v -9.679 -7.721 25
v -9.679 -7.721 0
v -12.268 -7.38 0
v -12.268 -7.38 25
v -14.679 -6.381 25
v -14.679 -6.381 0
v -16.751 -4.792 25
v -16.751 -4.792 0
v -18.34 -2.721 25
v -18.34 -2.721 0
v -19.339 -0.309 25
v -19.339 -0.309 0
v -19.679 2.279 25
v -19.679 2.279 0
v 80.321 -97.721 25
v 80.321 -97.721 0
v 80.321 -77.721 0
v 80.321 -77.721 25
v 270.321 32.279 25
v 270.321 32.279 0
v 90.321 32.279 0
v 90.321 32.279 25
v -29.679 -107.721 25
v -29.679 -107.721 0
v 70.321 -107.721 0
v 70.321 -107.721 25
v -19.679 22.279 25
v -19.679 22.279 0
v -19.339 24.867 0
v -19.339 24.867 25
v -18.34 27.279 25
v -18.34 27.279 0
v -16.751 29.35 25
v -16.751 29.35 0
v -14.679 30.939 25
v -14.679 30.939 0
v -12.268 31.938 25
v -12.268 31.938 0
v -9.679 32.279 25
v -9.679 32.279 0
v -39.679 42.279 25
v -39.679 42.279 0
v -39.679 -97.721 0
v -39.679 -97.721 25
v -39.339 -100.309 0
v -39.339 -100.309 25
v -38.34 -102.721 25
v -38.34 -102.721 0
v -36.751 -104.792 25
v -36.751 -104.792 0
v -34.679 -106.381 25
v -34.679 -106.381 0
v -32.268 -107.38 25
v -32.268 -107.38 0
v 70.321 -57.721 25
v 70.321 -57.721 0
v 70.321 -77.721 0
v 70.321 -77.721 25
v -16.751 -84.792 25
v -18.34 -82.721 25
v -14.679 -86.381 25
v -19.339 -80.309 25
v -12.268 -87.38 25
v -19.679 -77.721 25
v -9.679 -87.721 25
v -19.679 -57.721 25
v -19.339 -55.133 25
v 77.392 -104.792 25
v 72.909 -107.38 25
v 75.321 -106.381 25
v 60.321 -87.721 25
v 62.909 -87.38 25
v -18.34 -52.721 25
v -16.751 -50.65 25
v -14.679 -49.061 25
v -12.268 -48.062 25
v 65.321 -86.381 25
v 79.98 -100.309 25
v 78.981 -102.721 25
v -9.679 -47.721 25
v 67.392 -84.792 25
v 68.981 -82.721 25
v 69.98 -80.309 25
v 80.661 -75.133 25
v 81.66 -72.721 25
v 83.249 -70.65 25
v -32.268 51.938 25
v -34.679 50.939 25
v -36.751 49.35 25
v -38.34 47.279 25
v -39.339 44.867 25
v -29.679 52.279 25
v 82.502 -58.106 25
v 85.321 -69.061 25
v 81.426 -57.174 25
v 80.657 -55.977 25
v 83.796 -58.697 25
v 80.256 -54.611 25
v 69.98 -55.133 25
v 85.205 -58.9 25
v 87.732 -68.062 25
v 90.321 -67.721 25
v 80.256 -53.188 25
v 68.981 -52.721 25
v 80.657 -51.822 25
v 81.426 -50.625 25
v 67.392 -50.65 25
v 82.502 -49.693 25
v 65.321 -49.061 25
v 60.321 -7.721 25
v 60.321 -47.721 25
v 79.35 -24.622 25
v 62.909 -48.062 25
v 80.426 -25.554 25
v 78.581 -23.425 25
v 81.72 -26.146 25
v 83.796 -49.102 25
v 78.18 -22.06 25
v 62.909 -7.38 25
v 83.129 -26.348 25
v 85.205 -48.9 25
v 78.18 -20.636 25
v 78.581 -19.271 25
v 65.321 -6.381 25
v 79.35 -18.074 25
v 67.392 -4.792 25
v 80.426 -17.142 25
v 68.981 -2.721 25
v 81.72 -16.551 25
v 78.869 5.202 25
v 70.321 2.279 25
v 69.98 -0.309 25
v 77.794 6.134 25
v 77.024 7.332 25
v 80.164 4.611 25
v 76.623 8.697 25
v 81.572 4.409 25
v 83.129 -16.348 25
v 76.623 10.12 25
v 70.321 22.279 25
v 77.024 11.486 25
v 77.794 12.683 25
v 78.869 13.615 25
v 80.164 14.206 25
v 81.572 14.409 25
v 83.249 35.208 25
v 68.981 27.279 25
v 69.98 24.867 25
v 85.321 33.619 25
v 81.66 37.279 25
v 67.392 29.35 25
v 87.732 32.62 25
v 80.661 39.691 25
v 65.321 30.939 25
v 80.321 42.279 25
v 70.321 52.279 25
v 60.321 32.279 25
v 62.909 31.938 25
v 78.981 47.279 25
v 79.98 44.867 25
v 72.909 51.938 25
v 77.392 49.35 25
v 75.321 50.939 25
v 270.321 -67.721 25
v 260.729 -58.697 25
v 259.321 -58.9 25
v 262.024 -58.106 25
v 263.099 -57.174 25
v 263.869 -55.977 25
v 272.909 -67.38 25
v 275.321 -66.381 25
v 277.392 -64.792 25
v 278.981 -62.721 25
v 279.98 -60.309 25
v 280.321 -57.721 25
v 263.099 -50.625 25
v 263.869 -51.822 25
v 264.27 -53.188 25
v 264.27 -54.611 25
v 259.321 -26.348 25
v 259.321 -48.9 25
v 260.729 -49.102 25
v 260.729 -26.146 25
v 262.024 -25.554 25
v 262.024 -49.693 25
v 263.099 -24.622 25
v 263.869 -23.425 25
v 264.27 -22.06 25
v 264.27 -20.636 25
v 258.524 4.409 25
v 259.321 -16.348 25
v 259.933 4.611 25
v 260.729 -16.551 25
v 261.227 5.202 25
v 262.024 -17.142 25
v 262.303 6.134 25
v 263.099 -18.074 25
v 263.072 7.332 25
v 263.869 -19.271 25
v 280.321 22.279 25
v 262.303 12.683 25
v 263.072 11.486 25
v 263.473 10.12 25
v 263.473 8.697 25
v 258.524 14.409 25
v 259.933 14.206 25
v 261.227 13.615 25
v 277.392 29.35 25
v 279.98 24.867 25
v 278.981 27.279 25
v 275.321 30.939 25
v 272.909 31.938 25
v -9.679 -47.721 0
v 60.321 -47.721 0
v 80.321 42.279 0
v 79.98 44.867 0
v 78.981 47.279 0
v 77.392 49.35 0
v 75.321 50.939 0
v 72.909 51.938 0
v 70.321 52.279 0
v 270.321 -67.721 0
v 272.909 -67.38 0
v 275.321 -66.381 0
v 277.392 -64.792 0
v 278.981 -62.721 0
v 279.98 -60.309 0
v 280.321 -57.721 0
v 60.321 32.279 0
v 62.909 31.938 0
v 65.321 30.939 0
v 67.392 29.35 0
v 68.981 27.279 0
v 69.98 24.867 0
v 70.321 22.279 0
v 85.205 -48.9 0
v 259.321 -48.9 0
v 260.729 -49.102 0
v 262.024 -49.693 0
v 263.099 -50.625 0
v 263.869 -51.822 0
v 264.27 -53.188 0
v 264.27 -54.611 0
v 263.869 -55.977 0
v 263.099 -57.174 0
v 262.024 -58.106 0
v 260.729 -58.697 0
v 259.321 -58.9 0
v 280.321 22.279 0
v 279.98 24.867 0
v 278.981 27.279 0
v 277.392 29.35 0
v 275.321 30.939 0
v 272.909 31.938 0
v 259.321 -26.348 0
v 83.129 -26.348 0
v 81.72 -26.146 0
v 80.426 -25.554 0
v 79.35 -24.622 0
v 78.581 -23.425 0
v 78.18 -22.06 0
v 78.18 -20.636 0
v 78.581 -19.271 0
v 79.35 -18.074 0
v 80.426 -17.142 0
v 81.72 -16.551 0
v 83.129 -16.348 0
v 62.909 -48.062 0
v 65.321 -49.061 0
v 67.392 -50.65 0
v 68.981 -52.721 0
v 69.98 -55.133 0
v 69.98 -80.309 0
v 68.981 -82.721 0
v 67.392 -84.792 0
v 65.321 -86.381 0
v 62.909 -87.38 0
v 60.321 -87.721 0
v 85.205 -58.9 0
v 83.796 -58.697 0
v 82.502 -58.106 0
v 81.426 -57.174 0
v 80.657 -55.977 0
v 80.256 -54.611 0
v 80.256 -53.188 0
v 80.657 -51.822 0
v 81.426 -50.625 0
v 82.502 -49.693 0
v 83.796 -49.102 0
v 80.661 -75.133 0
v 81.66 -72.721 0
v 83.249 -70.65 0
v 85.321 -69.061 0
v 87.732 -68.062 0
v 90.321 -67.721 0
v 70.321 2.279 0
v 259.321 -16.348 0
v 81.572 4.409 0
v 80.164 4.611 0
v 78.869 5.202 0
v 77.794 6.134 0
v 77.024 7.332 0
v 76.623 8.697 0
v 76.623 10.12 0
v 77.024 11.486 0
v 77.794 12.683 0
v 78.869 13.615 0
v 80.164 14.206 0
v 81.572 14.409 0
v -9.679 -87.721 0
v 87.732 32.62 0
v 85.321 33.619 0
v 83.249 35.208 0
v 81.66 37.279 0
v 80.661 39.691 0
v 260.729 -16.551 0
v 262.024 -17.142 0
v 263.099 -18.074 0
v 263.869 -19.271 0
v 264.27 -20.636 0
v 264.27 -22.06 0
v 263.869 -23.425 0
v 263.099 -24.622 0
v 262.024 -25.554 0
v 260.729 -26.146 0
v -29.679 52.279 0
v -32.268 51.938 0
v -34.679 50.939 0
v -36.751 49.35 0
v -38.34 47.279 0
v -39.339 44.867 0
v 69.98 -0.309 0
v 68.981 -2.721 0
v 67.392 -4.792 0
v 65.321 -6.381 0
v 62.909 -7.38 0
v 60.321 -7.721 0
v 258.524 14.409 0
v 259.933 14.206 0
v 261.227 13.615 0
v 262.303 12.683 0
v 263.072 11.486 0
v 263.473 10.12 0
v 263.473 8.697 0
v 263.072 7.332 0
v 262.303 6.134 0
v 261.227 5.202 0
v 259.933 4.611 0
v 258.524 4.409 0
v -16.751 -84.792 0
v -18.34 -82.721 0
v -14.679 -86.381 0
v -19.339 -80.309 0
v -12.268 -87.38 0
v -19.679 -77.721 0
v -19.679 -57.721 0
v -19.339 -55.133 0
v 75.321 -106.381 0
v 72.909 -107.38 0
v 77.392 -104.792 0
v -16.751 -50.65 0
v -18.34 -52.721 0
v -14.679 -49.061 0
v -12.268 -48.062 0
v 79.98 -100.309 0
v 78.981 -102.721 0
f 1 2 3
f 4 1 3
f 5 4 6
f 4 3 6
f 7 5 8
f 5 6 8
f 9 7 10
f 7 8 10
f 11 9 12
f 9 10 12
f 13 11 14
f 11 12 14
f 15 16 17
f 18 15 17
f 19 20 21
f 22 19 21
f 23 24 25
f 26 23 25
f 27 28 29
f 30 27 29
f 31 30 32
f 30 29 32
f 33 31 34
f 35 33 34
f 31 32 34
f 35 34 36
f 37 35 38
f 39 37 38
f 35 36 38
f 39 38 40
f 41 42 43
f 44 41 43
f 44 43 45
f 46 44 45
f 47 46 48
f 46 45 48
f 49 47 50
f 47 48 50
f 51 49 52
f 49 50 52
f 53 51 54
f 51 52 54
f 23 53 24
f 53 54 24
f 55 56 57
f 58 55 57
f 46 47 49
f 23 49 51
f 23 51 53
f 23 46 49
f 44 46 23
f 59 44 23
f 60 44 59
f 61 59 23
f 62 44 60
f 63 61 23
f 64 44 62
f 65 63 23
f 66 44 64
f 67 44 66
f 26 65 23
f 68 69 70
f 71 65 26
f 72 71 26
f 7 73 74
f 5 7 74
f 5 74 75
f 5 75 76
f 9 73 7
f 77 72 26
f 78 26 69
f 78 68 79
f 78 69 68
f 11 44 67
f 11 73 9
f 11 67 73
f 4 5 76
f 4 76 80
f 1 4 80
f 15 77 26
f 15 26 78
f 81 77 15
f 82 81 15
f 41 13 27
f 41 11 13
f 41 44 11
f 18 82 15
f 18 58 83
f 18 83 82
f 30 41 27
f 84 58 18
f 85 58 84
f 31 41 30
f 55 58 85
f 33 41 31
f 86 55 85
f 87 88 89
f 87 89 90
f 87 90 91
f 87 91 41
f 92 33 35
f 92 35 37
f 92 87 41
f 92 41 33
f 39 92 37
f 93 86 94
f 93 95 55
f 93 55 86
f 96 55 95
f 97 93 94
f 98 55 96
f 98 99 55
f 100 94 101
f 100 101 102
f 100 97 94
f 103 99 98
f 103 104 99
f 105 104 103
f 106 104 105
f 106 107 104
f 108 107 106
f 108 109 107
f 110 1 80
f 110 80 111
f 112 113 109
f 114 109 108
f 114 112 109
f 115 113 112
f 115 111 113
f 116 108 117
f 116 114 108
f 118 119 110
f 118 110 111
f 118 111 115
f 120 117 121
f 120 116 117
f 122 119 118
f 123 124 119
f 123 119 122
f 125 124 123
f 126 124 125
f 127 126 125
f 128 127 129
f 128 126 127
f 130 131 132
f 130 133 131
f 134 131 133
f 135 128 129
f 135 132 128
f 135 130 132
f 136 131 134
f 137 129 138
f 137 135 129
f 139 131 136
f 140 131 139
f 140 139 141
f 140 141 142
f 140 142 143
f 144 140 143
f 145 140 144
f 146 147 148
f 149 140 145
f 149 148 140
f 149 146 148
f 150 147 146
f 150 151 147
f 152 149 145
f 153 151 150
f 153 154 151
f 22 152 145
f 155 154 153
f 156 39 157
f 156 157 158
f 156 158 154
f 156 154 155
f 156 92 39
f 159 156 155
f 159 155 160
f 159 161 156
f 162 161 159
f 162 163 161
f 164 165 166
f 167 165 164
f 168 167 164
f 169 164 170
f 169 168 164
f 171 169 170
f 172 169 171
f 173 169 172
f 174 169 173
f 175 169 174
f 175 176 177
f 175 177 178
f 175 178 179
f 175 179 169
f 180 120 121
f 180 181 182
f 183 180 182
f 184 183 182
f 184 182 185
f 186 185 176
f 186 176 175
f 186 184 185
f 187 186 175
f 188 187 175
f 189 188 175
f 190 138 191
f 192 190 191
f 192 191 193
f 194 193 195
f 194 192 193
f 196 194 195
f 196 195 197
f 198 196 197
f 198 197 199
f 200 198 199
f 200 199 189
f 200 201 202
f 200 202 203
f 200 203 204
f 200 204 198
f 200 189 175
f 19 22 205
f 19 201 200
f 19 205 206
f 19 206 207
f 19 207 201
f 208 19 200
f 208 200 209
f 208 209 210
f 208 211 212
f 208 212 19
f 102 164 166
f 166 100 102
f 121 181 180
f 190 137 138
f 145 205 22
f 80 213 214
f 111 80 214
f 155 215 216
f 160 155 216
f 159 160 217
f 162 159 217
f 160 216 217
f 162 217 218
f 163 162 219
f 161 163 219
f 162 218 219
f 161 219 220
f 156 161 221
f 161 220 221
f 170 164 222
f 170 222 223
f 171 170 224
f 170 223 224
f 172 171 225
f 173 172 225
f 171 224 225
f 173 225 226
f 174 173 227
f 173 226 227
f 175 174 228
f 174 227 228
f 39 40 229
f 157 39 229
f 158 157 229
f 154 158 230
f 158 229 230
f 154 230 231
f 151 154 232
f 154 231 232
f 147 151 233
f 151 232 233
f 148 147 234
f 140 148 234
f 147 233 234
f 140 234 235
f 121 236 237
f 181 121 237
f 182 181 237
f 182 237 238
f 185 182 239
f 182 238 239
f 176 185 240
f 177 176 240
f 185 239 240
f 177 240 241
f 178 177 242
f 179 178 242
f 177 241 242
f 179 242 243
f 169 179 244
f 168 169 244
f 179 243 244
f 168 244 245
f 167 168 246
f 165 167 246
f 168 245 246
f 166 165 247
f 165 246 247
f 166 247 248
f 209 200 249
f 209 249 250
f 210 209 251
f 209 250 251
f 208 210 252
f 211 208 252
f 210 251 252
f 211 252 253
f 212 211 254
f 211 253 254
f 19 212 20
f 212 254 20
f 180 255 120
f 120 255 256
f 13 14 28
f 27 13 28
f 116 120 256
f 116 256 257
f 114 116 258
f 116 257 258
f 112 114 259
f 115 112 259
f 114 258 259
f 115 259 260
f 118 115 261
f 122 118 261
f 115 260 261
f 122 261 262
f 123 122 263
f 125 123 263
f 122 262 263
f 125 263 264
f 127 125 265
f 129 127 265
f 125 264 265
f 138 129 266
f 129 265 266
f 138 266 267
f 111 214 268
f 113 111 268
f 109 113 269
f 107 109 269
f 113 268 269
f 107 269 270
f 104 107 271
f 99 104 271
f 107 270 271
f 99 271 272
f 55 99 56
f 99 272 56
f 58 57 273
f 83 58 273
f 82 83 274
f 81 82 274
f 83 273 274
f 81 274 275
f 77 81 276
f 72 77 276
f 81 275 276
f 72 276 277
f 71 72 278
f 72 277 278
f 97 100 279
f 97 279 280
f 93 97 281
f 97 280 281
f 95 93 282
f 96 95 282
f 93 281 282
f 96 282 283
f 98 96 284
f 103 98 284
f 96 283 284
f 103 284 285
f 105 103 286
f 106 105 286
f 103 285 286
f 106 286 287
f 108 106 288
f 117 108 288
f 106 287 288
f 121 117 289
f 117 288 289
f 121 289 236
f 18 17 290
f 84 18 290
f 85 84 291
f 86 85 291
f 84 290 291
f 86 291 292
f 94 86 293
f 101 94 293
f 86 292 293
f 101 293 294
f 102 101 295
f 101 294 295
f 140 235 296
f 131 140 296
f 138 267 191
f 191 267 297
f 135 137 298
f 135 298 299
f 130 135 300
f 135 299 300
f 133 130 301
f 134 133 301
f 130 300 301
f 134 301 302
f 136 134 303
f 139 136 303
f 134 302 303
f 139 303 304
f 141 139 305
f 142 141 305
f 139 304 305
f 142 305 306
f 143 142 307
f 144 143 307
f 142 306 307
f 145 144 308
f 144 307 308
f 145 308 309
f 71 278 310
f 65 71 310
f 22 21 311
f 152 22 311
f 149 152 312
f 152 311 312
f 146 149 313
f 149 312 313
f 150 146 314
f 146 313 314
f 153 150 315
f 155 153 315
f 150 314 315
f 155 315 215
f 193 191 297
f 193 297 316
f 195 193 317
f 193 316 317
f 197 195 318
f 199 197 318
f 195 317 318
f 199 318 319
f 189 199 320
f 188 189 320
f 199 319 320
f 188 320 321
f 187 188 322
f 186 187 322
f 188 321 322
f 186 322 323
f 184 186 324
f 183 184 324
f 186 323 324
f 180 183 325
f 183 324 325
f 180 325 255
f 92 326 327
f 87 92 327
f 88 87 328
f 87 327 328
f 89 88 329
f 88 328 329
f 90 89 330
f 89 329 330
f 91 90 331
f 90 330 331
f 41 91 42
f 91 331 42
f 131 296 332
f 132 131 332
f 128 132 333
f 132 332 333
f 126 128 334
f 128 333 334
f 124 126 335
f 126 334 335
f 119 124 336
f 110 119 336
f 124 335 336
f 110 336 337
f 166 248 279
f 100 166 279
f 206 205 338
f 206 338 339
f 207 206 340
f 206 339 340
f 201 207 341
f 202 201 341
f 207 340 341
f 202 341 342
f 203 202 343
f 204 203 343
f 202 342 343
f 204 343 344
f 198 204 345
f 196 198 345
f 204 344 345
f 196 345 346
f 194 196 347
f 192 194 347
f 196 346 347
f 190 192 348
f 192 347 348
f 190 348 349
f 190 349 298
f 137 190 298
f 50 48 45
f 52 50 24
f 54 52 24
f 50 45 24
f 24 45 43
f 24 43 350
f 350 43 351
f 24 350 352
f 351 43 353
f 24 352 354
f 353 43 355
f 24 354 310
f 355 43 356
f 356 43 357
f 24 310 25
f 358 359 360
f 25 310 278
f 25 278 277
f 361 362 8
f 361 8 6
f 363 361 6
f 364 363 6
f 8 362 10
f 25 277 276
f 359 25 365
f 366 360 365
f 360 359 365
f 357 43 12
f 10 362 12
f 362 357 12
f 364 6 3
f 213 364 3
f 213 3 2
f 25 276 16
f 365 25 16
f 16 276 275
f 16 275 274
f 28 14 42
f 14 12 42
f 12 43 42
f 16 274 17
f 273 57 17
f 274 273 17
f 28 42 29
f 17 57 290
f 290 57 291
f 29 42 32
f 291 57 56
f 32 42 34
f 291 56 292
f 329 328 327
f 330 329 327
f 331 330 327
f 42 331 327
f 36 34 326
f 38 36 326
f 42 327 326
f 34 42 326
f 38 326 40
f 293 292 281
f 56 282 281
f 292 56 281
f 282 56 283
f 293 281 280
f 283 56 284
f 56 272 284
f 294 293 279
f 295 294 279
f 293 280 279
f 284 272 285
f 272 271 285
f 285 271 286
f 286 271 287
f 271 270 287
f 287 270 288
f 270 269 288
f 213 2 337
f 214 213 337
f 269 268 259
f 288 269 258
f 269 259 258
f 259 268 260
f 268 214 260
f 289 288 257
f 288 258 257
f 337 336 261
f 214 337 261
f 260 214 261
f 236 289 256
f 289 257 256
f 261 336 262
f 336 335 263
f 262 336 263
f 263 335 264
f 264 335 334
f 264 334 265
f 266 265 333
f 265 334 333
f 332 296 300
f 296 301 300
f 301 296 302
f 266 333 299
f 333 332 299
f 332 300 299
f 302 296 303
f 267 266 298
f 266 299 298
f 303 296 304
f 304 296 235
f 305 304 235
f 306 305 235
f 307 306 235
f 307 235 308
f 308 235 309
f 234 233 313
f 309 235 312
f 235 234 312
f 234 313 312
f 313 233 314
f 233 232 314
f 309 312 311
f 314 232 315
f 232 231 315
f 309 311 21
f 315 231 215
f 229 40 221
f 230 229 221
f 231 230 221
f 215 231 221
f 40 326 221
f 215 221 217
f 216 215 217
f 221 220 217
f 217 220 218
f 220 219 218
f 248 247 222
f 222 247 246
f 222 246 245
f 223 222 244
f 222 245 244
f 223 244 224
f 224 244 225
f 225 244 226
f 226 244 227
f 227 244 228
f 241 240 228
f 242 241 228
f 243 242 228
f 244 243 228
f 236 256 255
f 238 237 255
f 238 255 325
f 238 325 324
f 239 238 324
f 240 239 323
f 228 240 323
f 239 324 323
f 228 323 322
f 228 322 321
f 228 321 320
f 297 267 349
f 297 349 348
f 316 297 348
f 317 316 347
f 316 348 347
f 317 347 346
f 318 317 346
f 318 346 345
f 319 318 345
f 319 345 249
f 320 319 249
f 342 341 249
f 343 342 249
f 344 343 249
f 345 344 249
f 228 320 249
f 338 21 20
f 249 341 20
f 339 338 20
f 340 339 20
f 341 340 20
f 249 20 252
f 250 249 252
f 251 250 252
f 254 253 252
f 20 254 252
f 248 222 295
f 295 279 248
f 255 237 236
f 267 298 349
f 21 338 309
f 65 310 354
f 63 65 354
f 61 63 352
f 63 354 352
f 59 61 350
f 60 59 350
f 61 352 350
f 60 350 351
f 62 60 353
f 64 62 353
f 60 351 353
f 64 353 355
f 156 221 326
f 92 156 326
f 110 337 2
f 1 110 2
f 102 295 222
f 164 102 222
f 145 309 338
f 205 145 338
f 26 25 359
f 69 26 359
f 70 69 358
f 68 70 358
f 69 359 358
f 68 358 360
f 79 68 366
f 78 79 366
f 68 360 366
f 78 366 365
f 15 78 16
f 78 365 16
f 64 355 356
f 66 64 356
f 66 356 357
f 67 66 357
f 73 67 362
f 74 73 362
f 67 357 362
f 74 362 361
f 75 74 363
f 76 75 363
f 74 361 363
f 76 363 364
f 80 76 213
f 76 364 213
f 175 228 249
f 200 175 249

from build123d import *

# Parameters (mm, degrees)
F1_DEPTH = 25


with BuildPart() as f1:
    # F0 (on Top) → F1 (new body)
    with BuildSketch(Plane.XY):
        with BuildLine():
            ThreePointArc((-29.679486, 52.278812), (-36.750554, 49.34988), (-39.679486, 42.278812))
            Line((-39.679486, 42.278812), (-39.679486, -97.721188))
            ThreePointArc((-39.679486, -97.721188), (-36.750554, -104.792256), (-29.679486, -107.721188))
            Line((-29.679486, -107.721188), (70.320514, -107.721188))
            ThreePointArc((70.320514, -107.721188), (77.391582, -104.792256), (80.320514, -97.721188))
            Line((80.320514, -97.721188), (80.320514, -77.721188))
            ThreePointArc((80.320514, -77.721188), (83.249446, -70.65012), (90.320514, -67.721188))
            Line((90.320514, -67.721188), (270.320514, -67.721188))
            ThreePointArc((270.320514, -67.721188), (277.391582, -64.792256), (280.320514, -57.721188))
            Line((280.320514, -57.721188), (280.320514, 22.278812))
            ThreePointArc((280.320514, 22.278812), (277.391582, 29.34988), (270.320514, 32.278812))
            Line((270.320514, 32.278812), (90.320514, 32.278812))
            ThreePointArc((90.320514, 32.278812), (83.249446, 35.207744), (80.320514, 42.278812))
            ThreePointArc((80.320514, 42.278812), (77.391582, 49.34988), (70.320514, 52.278812))
            Line((70.320514, 52.278812), (-29.679486, 52.278812))
        make_face()
        with BuildLine():
            ThreePointArc((-19.679486, -57.721188), (-16.750554, -50.65012), (-9.679486, -47.721188))
            Line((-9.679486, -47.721188), (60.320514, -47.721188))
            ThreePointArc((60.320514, -47.721188), (67.391582, -50.65012), (70.320514, -57.721188))
            Line((70.320514, -57.721188), (70.320514, -77.721188))
            ThreePointArc((70.320514, -77.721188), (67.391582, -84.792256), (60.320514, -87.721188))
            Line((60.320514, -87.721188), (-9.679486, -87.721188))
            ThreePointArc((-9.679486, -87.721188), (-16.750554, -84.792256), (-19.679486, -77.721188))
            Line((-19.679486, -77.721188), (-19.679486, -57.721188))
        make_face(mode=Mode.SUBTRACT)
        with BuildLine():
            Line((259.320514, -58.89954), (85.204735, -58.89954))
            ThreePointArc((85.204735, -58.89954), (80.204735, -53.89954), (85.204735, -48.89954))
            Line((85.204735, -48.89954), (259.320514, -48.89954))
            ThreePointArc((259.320514, -48.89954), (264.320514, -53.89954), (259.320514, -58.89954))
        make_face(mode=Mode.SUBTRACT)
        with BuildLine():
            ThreePointArc((-19.679486, 22.278812), (-16.750554, 29.34988), (-9.679486, 32.278812))
            Line((-9.679486, 32.278812), (60.320514, 32.278812))
            ThreePointArc((60.320514, 32.278812), (67.391582, 29.34988), (70.320514, 22.278812))
            Line((70.320514, 22.278812), (70.320514, 2.278812))
            ThreePointArc((70.320514, 2.278812), (67.391582, -4.792256), (60.320514, -7.721188))
            Line((60.320514, -7.721188), (-9.679486, -7.721188))
            ThreePointArc((-9.679486, -7.721188), (-16.750554, -4.792256), (-19.679486, 2.278812))
            Line((-19.679486, 2.278812), (-19.679486, 22.278812))
        make_face(mode=Mode.SUBTRACT)
        with BuildLine():
            Line((259.320514, -26.34807), (83.129056, -26.34807))
            ThreePointArc((83.129056, -26.34807), (78.129056, -21.34807), (83.129056, -16.34807))
            Line((83.129056, -16.34807), (259.320514, -16.34807))
            ThreePointArc((259.320514, -16.34807), (264.320514, -21.34807), (259.320514, -26.34807))
        make_face(mode=Mode.SUBTRACT)
        with BuildLine():
            Line((258.52415, 4.408746), (81.572294, 4.408746))
            ThreePointArc((81.572294, 4.408746), (76.572294, 9.408746), (81.572294, 14.408746))
            Line((81.572294, 14.408746), (258.52415, 14.408746))
            ThreePointArc((258.52415, 14.408746), (263.52415, 9.408746), (258.52415, 4.408746))
        make_face(mode=Mode.SUBTRACT)
    extrude(amount=F1_DEPTH)


solid = f1.part
